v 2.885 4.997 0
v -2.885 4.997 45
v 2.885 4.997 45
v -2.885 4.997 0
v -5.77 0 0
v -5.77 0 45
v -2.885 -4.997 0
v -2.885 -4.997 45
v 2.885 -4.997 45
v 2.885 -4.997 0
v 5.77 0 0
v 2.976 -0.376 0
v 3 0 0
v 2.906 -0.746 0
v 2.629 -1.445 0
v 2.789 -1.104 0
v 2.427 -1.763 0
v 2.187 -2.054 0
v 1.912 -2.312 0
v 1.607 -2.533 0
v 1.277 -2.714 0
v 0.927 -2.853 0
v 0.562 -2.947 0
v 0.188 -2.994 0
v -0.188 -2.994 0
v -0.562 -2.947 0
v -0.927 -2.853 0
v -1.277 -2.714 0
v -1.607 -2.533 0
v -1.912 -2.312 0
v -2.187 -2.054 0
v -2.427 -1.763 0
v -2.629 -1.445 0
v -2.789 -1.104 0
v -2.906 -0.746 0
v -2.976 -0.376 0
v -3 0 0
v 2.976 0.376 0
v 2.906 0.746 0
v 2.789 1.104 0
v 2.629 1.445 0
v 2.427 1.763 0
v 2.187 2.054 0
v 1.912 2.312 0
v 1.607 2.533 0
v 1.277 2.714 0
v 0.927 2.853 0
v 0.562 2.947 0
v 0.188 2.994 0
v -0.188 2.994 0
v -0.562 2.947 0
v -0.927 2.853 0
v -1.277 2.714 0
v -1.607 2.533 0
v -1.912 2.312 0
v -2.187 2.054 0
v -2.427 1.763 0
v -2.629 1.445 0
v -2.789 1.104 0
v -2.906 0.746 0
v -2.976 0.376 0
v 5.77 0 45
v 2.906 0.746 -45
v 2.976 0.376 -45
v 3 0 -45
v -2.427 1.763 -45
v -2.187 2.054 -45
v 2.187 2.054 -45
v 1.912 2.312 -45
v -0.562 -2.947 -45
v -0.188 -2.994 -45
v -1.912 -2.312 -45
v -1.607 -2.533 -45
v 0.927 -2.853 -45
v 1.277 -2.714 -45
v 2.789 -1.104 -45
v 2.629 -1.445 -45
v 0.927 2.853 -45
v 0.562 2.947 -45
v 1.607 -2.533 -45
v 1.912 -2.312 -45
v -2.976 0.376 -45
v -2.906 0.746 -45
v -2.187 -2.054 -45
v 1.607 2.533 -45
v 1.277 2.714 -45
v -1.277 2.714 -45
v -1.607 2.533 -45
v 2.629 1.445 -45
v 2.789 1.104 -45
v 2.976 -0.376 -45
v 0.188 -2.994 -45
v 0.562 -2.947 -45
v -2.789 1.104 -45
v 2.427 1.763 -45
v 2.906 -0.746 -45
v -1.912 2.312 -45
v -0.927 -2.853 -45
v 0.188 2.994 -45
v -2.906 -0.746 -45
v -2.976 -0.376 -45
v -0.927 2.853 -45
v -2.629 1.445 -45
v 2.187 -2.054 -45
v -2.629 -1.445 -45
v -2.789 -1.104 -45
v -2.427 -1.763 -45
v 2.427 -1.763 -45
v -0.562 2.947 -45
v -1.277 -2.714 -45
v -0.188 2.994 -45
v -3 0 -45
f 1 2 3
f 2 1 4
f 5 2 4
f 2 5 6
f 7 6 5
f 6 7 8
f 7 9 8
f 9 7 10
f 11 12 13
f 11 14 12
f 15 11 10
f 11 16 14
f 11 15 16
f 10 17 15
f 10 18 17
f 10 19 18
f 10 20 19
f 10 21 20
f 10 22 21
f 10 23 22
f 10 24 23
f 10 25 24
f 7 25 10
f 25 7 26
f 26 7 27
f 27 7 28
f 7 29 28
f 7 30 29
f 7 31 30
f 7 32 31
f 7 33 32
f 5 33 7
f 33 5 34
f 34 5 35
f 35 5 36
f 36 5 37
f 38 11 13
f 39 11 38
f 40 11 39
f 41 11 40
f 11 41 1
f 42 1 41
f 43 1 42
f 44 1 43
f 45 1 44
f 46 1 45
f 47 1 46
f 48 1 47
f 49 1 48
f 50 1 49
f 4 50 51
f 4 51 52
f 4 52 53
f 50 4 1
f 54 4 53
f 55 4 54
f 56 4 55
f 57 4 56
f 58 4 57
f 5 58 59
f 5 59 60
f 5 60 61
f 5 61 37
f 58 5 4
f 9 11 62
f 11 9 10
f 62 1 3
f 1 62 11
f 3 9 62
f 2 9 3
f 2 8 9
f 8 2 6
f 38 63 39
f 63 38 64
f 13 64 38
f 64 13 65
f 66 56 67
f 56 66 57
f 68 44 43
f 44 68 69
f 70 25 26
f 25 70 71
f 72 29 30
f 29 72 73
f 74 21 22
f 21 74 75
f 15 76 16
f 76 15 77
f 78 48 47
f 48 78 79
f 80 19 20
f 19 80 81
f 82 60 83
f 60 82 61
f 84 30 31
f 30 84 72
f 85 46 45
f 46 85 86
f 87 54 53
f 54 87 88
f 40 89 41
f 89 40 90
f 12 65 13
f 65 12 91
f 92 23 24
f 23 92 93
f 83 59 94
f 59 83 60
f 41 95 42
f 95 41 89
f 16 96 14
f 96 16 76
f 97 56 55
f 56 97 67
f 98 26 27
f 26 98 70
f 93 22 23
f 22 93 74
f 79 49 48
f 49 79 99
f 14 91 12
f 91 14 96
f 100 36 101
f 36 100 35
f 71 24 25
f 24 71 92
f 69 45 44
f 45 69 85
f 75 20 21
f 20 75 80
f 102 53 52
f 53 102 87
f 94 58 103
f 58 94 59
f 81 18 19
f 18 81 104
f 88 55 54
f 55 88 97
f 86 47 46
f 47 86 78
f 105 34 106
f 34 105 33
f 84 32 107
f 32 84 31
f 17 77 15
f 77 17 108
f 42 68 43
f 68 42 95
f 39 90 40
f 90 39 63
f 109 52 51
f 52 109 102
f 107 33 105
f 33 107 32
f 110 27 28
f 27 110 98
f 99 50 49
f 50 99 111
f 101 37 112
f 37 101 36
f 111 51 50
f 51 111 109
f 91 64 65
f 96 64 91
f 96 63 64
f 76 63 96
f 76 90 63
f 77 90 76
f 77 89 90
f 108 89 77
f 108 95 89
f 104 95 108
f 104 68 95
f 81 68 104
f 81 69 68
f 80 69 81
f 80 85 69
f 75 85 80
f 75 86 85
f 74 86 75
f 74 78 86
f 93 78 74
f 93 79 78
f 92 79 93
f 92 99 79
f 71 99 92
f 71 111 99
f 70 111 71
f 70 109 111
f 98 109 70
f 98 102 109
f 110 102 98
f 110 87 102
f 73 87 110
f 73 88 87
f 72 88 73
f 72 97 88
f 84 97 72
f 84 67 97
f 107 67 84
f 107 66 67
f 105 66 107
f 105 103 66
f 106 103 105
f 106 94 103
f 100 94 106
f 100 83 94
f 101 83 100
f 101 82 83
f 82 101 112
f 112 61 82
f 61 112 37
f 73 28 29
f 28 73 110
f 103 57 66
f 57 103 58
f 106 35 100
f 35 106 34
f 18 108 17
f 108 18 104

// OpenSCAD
$fn = 50;


difference() {
	union() {
		translate(v = [0, 0, 0]) {
			rotate(a = [0, 0, 0]) {
				translate(v = [0, 0, 0]) {
					rotate(a = [0, 0, 0]) {
						linear_extrude(height = 45) {
							polygon(points = [[5.7700000000, 0.0000000000], [2.8850000000, 4.9969665798], [-2.8850000000, 4.9969665798], [-5.7700000000, 0.0000000000], [-2.8850000000, -4.9969665798], [2.8850000000, -4.9969665798]]);
						}
					}
				}
			}
		}
		translate(v = [0, 0, -45]) {
			rotate(a = [0, 0, 0]) {
				cylinder(h = 45, r = 3.0000000000);
			}
		}
	}
	union();
}
